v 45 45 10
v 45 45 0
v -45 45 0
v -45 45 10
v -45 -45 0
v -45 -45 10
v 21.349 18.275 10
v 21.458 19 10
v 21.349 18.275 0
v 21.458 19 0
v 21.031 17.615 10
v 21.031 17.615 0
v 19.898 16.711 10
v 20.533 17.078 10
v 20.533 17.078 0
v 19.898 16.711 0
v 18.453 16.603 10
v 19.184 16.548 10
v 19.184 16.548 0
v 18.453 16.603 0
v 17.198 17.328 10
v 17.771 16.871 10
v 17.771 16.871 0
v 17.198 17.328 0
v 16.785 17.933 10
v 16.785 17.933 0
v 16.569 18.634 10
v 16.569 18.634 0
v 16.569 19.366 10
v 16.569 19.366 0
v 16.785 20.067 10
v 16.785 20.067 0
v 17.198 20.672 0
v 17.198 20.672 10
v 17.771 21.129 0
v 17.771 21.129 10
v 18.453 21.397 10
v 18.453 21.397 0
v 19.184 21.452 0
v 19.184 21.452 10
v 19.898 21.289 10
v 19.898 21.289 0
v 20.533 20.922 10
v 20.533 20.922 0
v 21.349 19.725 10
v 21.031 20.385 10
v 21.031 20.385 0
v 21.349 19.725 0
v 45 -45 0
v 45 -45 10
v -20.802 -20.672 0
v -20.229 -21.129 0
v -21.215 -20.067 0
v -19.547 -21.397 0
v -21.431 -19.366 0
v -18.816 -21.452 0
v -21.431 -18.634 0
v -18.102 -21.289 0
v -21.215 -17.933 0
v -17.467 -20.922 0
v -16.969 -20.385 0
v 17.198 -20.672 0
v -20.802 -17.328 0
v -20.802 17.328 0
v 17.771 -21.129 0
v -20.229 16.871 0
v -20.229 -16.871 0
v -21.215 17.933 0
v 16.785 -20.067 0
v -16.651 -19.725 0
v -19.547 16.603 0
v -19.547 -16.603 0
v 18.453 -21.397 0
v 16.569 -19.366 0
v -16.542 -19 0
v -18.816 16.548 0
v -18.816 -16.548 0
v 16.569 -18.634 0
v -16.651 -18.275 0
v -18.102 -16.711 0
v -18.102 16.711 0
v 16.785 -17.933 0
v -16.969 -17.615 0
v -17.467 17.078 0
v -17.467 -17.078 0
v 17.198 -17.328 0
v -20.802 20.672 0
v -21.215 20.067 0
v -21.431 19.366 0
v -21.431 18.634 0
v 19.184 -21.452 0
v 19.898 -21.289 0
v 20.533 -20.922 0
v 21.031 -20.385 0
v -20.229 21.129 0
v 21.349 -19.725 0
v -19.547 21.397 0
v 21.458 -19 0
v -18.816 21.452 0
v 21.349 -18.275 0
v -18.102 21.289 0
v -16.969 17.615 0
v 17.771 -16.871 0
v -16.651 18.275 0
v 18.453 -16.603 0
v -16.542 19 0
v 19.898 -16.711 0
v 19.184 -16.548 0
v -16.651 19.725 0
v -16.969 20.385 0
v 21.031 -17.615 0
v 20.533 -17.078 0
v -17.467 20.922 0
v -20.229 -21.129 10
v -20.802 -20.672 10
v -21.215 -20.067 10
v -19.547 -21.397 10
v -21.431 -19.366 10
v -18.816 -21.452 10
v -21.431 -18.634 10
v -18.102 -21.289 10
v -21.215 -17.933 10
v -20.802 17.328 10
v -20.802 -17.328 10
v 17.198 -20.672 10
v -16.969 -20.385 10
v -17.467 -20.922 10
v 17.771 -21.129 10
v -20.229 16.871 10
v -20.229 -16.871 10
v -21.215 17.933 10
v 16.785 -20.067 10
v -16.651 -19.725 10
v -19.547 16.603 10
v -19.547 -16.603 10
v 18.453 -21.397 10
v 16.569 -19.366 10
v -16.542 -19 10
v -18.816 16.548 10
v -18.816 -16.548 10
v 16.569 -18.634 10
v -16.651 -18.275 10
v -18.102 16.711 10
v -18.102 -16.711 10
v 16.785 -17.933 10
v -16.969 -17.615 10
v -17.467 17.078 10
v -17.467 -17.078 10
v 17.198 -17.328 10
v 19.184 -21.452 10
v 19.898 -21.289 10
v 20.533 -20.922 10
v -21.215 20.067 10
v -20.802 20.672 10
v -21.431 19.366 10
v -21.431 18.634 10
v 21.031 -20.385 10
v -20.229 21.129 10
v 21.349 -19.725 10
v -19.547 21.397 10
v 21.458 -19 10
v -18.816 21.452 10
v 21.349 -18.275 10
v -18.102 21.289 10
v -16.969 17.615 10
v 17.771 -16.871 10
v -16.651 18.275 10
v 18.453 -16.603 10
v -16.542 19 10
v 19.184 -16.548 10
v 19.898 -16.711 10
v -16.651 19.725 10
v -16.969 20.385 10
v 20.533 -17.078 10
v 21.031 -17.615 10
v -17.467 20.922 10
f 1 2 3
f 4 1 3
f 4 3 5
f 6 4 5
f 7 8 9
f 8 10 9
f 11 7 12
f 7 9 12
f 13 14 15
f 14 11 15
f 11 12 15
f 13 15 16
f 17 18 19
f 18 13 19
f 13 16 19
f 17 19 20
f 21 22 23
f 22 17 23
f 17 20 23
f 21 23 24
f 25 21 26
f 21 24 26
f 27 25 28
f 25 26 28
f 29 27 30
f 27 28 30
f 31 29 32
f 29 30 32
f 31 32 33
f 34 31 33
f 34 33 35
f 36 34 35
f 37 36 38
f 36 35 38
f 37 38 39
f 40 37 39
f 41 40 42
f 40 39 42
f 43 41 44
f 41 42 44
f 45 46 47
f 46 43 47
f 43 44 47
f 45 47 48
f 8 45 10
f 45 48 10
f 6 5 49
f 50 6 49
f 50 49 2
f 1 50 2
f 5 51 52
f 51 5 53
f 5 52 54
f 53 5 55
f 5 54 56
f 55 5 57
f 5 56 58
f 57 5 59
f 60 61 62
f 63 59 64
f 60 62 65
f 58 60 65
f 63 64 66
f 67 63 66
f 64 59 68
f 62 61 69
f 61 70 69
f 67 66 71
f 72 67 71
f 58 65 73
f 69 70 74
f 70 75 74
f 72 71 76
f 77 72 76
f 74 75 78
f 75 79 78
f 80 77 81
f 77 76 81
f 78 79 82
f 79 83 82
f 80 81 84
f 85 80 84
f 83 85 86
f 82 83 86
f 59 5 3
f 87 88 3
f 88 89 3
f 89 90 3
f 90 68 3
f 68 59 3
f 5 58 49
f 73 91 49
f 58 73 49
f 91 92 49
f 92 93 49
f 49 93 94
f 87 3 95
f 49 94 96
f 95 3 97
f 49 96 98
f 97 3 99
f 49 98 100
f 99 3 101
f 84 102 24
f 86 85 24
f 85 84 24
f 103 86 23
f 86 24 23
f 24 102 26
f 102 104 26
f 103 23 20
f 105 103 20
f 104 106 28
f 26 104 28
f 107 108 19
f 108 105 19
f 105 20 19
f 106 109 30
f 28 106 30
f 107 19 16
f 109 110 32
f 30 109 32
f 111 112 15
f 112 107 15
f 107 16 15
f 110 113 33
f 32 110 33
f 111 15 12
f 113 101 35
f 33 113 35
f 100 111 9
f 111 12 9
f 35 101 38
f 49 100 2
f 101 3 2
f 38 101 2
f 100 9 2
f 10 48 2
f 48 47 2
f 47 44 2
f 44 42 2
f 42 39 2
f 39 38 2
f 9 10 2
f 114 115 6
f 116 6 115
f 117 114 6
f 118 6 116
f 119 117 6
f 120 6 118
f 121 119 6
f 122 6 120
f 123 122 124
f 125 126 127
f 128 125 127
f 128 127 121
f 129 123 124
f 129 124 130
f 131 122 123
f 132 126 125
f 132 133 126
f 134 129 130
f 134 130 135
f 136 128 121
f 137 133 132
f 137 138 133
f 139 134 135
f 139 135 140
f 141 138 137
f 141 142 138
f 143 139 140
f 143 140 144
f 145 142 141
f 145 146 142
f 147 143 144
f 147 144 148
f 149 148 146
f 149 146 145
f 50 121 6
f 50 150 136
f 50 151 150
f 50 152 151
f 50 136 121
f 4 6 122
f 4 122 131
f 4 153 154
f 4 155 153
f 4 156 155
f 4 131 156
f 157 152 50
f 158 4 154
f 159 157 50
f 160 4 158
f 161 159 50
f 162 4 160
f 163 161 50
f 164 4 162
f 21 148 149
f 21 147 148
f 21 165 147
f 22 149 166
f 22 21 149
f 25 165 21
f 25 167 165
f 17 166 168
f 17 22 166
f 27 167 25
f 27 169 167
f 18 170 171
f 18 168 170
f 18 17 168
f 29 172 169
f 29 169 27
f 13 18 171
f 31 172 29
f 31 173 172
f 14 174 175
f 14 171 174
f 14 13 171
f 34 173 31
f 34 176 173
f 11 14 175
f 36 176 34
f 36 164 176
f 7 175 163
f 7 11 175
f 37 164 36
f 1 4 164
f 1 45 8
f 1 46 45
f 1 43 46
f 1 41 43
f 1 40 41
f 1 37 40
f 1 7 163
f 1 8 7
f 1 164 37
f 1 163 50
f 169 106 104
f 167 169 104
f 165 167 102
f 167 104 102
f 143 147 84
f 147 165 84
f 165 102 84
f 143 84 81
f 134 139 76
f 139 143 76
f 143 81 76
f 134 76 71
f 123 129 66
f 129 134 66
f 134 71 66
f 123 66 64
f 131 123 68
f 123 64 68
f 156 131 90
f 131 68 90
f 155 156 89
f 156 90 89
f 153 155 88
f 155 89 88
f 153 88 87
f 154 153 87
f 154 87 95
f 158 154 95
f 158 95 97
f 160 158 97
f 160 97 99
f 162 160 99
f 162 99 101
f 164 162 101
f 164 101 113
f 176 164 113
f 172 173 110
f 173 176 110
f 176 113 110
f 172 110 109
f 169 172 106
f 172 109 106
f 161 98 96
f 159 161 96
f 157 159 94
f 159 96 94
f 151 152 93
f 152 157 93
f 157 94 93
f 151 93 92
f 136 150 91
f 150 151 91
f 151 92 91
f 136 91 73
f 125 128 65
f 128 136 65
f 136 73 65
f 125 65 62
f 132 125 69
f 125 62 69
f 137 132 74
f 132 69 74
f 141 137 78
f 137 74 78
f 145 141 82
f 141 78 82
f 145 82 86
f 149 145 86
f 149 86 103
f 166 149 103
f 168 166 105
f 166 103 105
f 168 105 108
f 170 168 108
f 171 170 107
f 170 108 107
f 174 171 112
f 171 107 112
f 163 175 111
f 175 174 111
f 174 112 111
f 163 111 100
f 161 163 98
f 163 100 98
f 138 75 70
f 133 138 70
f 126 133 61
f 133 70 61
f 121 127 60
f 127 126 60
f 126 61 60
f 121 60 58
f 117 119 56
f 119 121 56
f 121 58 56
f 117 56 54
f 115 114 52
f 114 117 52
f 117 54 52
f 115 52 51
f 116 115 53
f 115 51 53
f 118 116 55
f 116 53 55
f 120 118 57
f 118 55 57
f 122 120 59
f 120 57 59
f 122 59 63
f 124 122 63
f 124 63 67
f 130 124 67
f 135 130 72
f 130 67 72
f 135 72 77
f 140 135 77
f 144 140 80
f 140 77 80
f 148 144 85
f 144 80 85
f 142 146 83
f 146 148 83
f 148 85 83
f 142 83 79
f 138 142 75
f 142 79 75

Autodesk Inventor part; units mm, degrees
ref_plane "YZ Plane" through (0, 0, 0) normal (1, 0, 0) x (0, 1, 0)
ref_plane "XZ Plane" through (0, 0, 0) normal (0, 1, 0) x (-1, 0, 0)
ref_plane "XY Plane" through (0, 0, 0) normal (0, 0, 1) x (1, 0, 0)
ref_plane "Work Plane1" through (0, 0, 0) normal (0, 0, 1) x (1, 0, 0)
sketch "Sketch1" plane through (0, 0, 0) normal (0, 0, 1) x (1, 0, 0)
  line L0 (45, 45) -> (-45, 45)
  line L1 (-45, 45) -> (-45, -45)
  line L2 (-45, -45) -> (45, -45)
  line L3 (45, -45) -> (45, 45)
  line L4 (45, 45) -> (-45, -45) construction
  line L5 (-45, 45) -> (45, -45) construction
  circle A0 centre (19, 19) radius 2.4585 projected
  circle A1 centre (19, -19) radius 2.4585 projected
  circle A2 centre (-19, -19) radius 2.4585 projected
  circle A3 centre (-19, 19) radius 2.4585 projected
  point P0 (0, 0)
  point P1 (0, 0)
  dimension "d0" = 90
  dimension "d1" = 90
extrude "Extrusion1" add sketch "Sketch1" along normal blind 10
properties part number "Sujeción Cilindro Cortadora"
